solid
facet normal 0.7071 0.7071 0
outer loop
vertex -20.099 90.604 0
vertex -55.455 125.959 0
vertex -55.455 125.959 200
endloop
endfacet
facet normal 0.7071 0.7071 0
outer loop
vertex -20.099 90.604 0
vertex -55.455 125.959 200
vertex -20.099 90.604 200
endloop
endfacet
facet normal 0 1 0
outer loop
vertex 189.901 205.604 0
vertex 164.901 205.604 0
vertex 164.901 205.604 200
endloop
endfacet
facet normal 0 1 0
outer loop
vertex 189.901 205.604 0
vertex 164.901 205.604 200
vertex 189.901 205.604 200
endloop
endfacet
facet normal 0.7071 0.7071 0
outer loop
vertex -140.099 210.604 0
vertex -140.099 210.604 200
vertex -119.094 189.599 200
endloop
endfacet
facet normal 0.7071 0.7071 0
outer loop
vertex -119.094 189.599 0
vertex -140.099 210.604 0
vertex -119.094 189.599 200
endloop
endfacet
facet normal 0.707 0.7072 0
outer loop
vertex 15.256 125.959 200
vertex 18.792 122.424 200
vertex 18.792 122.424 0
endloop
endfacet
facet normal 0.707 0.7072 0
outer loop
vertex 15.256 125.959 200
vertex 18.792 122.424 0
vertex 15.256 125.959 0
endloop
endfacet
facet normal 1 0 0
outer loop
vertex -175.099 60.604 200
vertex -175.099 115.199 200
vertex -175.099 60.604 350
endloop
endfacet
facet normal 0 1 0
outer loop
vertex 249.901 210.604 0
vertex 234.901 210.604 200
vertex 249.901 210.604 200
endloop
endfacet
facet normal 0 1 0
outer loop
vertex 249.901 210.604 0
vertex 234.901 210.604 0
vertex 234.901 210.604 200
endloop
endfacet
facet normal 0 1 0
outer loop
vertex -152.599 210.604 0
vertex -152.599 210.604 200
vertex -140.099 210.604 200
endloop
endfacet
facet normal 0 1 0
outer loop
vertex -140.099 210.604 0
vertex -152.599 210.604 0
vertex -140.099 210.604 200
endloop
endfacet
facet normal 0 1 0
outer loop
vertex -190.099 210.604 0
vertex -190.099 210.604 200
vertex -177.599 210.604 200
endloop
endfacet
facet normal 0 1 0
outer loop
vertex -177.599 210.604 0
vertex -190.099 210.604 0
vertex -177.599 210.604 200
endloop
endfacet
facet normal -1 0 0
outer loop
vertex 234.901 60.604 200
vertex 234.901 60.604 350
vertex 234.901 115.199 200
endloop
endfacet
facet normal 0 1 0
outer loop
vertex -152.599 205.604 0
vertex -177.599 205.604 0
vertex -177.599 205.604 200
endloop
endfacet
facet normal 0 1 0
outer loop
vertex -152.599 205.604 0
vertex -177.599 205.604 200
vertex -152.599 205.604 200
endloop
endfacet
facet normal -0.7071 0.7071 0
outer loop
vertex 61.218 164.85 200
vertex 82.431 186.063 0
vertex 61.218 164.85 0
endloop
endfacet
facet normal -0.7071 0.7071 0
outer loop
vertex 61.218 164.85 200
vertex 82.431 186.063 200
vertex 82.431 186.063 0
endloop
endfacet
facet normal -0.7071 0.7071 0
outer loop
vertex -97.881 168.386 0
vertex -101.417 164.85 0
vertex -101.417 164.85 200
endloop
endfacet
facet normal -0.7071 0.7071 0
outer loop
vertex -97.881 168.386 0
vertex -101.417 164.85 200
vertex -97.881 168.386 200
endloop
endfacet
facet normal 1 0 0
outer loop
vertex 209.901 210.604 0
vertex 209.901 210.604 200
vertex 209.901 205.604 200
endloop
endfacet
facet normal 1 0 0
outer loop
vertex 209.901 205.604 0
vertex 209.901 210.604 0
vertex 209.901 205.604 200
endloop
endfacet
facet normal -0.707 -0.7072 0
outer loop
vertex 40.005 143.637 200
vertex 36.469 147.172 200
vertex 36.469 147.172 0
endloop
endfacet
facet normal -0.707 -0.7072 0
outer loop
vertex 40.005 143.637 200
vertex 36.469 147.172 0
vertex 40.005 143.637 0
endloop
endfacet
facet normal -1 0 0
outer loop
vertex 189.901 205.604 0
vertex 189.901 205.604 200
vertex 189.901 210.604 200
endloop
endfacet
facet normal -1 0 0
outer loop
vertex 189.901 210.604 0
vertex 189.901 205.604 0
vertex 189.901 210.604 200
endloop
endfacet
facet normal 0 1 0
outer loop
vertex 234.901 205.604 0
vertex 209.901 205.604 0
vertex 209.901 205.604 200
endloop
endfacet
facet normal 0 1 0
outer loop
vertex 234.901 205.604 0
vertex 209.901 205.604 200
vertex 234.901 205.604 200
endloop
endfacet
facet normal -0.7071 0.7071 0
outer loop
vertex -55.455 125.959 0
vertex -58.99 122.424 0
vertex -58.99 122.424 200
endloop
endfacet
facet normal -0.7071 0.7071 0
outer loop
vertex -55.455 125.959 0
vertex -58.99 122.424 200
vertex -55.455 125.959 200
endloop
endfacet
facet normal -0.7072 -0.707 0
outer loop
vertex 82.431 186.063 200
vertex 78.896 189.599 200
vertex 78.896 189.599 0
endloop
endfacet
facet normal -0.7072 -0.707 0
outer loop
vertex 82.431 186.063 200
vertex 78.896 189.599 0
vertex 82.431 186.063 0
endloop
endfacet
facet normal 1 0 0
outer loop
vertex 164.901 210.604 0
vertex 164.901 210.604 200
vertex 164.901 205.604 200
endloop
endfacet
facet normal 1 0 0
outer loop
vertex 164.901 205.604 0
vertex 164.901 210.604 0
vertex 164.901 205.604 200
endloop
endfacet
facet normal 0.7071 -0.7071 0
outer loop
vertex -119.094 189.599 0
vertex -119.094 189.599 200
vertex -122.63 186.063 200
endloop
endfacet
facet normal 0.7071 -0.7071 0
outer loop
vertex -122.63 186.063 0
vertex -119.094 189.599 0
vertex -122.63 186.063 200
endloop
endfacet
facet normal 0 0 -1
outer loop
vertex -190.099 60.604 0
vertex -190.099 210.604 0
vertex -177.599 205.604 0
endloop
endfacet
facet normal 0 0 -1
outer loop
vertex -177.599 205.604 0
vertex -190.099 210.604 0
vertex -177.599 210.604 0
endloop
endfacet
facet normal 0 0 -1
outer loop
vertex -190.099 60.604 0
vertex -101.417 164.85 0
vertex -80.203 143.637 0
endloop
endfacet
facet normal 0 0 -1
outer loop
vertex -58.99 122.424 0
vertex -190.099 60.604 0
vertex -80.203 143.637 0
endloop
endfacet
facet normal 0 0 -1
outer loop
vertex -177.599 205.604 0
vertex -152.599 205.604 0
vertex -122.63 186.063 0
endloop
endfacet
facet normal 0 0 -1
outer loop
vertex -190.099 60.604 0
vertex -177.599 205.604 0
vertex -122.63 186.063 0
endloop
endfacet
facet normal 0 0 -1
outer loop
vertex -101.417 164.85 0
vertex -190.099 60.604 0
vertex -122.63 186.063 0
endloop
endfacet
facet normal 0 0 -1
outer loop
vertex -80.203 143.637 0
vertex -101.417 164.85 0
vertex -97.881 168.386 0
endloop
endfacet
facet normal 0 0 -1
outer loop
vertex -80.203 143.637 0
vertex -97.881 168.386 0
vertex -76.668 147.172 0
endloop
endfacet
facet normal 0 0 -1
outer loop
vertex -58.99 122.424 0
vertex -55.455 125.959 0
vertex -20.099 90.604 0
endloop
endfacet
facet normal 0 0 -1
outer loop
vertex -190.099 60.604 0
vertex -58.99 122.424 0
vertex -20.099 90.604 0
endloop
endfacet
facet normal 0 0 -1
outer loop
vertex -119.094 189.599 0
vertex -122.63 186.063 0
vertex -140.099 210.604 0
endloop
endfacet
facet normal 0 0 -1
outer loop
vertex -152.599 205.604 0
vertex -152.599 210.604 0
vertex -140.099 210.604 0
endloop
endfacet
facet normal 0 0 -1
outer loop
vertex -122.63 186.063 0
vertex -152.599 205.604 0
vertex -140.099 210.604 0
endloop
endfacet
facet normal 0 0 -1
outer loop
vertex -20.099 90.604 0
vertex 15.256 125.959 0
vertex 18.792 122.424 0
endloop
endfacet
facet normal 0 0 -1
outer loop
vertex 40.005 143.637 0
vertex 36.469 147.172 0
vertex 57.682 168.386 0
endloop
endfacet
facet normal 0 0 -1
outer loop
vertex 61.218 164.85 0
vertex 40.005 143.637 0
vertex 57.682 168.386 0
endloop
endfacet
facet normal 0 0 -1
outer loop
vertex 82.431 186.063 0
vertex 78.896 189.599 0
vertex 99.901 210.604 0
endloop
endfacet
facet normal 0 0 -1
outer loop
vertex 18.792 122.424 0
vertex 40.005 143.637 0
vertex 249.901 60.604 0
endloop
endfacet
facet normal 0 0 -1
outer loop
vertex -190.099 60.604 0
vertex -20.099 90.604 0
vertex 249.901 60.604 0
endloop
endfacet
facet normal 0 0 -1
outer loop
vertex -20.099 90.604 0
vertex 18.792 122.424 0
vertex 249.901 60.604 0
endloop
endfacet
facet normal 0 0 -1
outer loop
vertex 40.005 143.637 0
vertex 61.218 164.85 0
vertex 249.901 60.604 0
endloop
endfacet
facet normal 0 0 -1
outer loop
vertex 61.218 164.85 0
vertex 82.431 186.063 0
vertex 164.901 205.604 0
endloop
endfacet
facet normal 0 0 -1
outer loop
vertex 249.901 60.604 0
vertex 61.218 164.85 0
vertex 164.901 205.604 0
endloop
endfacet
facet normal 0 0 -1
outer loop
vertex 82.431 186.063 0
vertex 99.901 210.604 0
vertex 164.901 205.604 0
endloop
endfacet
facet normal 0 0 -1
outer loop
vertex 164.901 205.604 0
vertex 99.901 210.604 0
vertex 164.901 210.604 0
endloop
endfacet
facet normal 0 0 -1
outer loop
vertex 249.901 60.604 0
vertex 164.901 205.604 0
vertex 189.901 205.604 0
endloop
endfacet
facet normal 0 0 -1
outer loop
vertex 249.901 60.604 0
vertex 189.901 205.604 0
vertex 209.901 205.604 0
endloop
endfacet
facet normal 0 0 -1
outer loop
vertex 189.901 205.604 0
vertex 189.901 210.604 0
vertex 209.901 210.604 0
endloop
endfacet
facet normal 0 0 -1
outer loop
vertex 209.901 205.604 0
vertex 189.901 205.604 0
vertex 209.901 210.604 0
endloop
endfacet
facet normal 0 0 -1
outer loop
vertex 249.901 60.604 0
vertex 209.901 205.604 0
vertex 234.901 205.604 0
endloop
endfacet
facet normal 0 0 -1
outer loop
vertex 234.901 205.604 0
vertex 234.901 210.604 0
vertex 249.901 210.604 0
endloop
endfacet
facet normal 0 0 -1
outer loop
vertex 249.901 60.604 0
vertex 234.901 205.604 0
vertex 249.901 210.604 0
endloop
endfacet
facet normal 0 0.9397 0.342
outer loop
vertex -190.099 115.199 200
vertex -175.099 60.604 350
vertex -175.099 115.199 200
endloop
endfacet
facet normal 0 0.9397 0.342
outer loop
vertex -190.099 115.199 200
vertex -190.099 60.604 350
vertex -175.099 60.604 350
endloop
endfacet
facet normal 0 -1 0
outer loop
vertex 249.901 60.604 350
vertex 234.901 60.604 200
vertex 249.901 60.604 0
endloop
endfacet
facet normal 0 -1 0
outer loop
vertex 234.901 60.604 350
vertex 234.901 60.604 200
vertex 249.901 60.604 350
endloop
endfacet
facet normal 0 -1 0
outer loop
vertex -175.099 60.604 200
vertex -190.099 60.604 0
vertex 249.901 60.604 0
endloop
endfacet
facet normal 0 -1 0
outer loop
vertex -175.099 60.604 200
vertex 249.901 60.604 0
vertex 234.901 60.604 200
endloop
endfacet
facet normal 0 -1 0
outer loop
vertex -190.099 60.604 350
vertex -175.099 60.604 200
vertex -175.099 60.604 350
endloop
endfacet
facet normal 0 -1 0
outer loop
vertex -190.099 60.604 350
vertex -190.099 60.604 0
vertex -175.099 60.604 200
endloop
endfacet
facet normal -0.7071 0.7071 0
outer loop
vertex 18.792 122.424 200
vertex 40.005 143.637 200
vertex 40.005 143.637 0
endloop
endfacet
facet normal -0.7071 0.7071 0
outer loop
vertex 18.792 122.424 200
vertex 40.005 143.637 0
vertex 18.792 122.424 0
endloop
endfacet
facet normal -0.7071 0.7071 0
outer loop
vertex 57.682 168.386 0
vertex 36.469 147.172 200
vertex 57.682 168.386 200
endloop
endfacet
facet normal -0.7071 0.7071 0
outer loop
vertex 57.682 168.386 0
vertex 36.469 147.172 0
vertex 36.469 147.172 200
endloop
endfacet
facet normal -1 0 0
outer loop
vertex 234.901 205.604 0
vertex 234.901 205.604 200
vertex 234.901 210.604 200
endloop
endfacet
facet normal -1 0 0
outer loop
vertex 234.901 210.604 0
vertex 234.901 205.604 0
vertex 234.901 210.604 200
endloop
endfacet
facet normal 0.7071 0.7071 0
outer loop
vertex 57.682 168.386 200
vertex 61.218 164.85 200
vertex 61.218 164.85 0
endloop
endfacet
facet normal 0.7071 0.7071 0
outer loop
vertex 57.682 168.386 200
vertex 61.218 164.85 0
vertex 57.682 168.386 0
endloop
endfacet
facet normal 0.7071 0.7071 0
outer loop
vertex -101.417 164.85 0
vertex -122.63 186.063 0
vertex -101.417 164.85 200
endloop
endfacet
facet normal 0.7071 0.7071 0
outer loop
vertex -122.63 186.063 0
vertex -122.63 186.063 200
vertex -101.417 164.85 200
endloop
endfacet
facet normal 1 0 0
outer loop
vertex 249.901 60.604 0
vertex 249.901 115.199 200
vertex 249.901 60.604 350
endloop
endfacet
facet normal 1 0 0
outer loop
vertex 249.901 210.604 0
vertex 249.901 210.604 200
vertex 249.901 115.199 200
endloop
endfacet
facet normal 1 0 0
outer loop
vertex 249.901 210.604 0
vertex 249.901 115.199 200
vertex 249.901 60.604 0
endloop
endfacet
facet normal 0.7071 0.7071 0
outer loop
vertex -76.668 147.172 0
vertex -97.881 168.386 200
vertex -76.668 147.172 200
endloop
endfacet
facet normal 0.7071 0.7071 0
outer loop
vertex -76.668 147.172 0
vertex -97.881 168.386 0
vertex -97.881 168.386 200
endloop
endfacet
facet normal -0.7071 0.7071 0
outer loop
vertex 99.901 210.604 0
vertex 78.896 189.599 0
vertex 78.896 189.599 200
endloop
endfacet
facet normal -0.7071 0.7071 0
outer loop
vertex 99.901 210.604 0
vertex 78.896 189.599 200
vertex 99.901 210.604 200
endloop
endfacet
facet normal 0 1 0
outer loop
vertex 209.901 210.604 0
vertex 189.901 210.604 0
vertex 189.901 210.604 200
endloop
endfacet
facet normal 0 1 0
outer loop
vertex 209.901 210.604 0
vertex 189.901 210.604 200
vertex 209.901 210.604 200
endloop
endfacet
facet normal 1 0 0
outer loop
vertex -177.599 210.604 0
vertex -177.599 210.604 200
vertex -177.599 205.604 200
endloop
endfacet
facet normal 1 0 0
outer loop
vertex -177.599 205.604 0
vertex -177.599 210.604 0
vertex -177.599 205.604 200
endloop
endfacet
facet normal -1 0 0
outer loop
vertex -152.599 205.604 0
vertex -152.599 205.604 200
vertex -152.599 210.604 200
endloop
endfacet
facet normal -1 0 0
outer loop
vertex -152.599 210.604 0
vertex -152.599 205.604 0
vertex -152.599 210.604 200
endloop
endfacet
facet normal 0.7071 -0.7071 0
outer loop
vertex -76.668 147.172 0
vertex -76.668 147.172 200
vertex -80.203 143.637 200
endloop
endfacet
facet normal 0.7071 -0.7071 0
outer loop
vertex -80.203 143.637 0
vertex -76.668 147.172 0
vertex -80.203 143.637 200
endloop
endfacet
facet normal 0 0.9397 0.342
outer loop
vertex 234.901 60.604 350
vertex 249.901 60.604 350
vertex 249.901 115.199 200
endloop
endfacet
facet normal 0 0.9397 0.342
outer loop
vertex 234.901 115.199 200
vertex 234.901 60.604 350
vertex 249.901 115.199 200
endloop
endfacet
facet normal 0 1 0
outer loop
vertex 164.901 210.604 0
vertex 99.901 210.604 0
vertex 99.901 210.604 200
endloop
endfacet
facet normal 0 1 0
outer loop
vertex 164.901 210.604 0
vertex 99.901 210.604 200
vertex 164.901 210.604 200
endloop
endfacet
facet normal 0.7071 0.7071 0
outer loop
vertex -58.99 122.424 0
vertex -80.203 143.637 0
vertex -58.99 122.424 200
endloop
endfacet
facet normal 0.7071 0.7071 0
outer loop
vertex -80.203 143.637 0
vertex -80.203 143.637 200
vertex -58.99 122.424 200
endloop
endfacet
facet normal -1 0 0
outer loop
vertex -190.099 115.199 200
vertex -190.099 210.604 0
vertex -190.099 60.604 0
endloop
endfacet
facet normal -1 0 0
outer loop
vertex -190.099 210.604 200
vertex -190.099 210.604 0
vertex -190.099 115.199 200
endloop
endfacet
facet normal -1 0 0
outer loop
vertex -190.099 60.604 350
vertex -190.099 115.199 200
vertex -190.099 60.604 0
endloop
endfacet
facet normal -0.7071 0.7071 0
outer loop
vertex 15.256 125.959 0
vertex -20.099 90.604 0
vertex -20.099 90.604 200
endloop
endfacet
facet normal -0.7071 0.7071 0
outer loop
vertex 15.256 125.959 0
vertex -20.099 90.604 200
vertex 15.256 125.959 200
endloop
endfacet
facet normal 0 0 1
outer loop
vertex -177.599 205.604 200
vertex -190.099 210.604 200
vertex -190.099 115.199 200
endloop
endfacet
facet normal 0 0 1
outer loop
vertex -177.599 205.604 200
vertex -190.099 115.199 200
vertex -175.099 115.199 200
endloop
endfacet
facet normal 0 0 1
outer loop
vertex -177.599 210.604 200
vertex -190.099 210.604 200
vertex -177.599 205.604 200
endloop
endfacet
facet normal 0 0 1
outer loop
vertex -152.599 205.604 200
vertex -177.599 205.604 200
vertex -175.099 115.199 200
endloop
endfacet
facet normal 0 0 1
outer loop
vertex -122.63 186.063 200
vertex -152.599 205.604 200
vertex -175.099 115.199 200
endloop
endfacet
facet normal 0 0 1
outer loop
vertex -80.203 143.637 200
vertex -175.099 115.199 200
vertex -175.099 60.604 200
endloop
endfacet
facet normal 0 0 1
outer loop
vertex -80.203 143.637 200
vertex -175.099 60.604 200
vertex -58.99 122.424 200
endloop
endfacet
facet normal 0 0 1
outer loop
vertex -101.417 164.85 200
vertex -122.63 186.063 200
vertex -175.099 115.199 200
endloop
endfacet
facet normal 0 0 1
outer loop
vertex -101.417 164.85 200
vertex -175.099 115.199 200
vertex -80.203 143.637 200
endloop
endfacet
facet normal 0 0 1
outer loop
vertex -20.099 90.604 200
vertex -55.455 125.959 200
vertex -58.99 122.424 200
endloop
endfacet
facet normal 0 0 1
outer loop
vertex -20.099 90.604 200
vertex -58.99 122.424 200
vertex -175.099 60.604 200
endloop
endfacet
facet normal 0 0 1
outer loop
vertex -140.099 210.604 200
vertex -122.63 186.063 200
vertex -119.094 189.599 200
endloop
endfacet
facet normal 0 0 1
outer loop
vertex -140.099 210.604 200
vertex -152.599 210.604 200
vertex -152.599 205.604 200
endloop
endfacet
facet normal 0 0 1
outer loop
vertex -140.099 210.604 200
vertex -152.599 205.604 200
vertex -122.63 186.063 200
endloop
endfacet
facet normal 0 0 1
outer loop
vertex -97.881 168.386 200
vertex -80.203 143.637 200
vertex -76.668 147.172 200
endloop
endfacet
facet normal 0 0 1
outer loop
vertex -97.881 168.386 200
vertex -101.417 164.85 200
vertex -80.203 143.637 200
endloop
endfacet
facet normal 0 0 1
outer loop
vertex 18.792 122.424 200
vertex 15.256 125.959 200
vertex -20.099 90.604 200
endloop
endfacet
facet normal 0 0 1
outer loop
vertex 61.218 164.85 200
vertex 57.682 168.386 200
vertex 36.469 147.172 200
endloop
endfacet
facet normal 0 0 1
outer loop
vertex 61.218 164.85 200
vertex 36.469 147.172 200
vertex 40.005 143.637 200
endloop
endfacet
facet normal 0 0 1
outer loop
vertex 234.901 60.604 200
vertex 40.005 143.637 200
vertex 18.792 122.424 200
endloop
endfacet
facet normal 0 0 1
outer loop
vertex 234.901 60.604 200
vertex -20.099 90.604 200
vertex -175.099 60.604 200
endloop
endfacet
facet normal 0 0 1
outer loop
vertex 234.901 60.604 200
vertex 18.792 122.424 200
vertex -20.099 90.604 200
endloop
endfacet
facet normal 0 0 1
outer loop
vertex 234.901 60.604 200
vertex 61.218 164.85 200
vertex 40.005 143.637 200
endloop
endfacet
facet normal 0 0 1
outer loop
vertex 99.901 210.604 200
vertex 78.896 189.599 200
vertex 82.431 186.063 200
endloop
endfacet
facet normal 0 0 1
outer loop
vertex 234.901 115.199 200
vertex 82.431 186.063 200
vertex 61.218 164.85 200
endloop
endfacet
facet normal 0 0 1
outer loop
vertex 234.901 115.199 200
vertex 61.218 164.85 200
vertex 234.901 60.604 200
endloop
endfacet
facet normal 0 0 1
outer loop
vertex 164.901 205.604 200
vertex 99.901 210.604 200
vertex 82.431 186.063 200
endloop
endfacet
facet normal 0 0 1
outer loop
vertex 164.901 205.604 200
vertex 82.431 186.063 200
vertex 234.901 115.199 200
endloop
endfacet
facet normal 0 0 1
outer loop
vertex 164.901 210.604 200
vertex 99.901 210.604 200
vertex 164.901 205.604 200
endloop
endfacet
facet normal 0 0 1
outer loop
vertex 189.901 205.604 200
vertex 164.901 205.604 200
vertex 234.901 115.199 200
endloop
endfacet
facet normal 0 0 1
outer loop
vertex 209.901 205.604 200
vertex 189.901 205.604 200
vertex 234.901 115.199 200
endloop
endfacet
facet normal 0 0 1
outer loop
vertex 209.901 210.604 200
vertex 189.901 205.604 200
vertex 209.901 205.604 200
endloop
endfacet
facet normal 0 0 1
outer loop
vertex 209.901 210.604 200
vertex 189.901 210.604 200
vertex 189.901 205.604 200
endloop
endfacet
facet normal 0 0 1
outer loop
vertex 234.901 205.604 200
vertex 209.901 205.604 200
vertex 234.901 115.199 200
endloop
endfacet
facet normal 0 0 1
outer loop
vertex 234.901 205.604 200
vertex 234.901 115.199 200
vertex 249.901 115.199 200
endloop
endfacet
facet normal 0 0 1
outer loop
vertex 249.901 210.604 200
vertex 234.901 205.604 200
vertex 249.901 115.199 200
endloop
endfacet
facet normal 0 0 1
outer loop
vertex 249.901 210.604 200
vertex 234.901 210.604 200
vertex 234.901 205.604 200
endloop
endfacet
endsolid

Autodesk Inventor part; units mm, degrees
ref_plane "YZ Plane" through (0, 0, 0) normal (1, 0, 0) x (0, 1, 0)
ref_plane "XZ Plane" through (0, 0, 0) normal (0, 1, 0) x (-1, 0, 0)
ref_plane "XY Plane" through (0, 0, 0) normal (0, 0, 1) x (1, 0, 0)
sketch "Sketch1" plane through (0, 0, 0) normal (0, 0, 1) x (1, 0, 0)
  line L0 (-190.0993, 60.6039) -> (-190.0993, 210.6039)
  line L1 (149.9007, 210.6039) -> (149.9007, 60.6039)
  line L2 (149.9007, 60.6039) -> (-190.0993, 60.6039)
  line L3 (149.9007, 210.6039) -> (249.9007, 210.6039)
  line L4 (249.9007, 210.6039) -> (249.9007, 60.6039)
  line L5 (249.9007, 60.6039) -> (149.9007, 60.6039)
  line L6 (-190.0993, 210.6039) -> (-140.0993, 210.6039)
  line L7 (-140.0993, 210.6039) -> (-20.0993, 90.6039)
  line L8 (-20.0993, 90.6039) -> (99.9007, 210.6039)
  line L9 (99.9007, 210.6039) -> (149.9007, 210.6039)
  point P0 (0, 0)
  dimension "d0" = 340
  dimension "d1" = 150
  dimension "d2" = 150
  dimension "d3" = 170
  dimension "d5" = 100
  dimension "d16" = 90
  dimension "d17" = 50
  dimension "d18" = 50
extrude "Extrusion1" add sketch "Sketch1" along normal blind 200
sketch "Sketch2" plane through (0, 0, 200) normal (0, 0, 1) x (1, 0, 0)
  point P0 (0, 0)
sketch "Sketch3" plane through (249.9007, 60.6039, 0) normal (1, 0, 0) x (0, 0, -1)
  line L0 (0, 0) -> (0, 150) projected
  line L1 (0, 150) -> (-200, 150) projected
  line L2 (-200, 0) -> (-200, 150) projected
  line L3 (0, 0) -> (-200, 0) projected
  line L4 (-200, 0) -> (-350, 0)
  line L5 (-350, 0) -> (-200, 54.5955)
  line L6 (-200, 0) -> (-200, 150) projected
  point P0 (0, -60.6039)
  dimension "d12" = 20
  dimension "d13" = 150
extrude "Extrusion2" add sketch "Sketch3" against normal blind 15 contours L4 L5 L2
sketch "Sketch4" plane through (-190.0993, 60.6039, 0) normal (-1, 0, 0) x (0, 0, 1)
  line L0 (200, 0) -> (200, 54.5955) projected
  line L1 (200, 0) -> (350, 0) projected
  line L2 (350, 0) -> (200, 54.5955) projected
  point P0 (0, -60.6039)
extrude "Extrusion3" add sketch "Sketch4" against normal blind 15
sketch "Sketch5" plane through (0, 0, 200) normal (0, 0, 1) x (1, 0, 0)
  line L0 (-119.0942, 189.5988) -> (-122.6298, 186.0633)
  line L1 (-122.6298, 186.0633) -> (-101.4166, 164.8501)
  line L2 (-101.4166, 164.8501) -> (-97.881, 168.3856)
  line L3 (-20.0993, 90.6039) -> (-140.0993, 210.6039) projected
  line L4 (-76.6678, 147.1724) -> (-80.2034, 143.6369)
  line L5 (-80.2034, 143.6369) -> (-58.9902, 122.4237)
  line L6 (-58.9902, 122.4237) -> (-55.4546, 125.9592)
  line L7 (-20.0993, 90.6039) -> (-20.0993, 149.2833) construction
  line L8 (78.8957, 189.5988) -> (82.4312, 186.0633)
  line L9 (82.4312, 186.0633) -> (61.218, 164.8501)
  line L10 (61.218, 164.8501) -> (57.6825, 168.3856)
  line L11 (36.4693, 147.1724) -> (40.0048, 143.6369)
  line L12 (40.0048, 143.6369) -> (18.7916, 122.4237)
  line L13 (18.7916, 122.4237) -> (15.256, 125.9592)
  line L14 (-175.0993, 115.1994) -> (-175.0993, 60.6039) projected
  line L15 (-175.0993, 60.6039) -> (234.9007, 60.6039) projected
  line L16 (234.9007, 60.6039) -> (234.9007, 115.1994) projected
  line L17 (234.9007, 115.1994) -> (249.9007, 115.1994) projected
  line L18 (249.9007, 115.1994) -> (249.9007, 210.6039) projected
  line L19 (249.9007, 210.6039) -> (99.9007, 210.6039) projected
  line L20 (99.9007, 210.6039) -> (-20.0993, 90.6039) projected
  line L21 (-20.0993, 90.6039) -> (-140.0993, 210.6039) projected
  line L22 (-140.0993, 210.6039) -> (-190.0993, 210.6039) projected
  line L23 (-190.0993, 210.6039) -> (-190.0993, 115.1994) projected
  line L24 (-190.0993, 115.1994) -> (-175.0993, 115.1994) projected
  line L25 (249.9007, 210.6039) -> (99.9007, 210.6039) projected
  line L26 (164.9007, 210.6039) -> (164.9007, 205.6039)
  line L27 (164.9007, 205.6039) -> (189.9007, 205.6039)
  line L28 (189.9007, 205.6039) -> (189.9007, 210.6039)
  line L29 (209.9007, 210.6039) -> (209.9007, 205.6039)
  line L30 (209.9007, 205.6039) -> (234.9007, 205.6039)
  line L31 (234.9007, 205.6039) -> (234.9007, 210.6039)
  line L32 (-140.0993, 210.6039) -> (-190.0993, 210.6039) projected
  line L33 (-177.5993, 210.6039) -> (-177.5993, 205.6039)
  line L34 (-177.5993, 205.6039) -> (-152.5993, 205.6039)
  line L35 (-152.5993, 205.6039) -> (-152.5993, 210.6039)
  point P0 (0, 0)
  point P1 (78.8957, 189.5988)
  point P2 (57.6825, 168.3856)
  point P3 (36.4693, 147.1724)
  dimension "d19" = 5
  dimension "d20" = 30
  dimension "d21" = 5
  dimension "d22" = 30
  dimension "d23" = 50
  dimension "d24" = 30
  dimension "d27" = 5
  dimension "d28" = 25
  dimension "d29" = 25
  dimension "d30" = 20
  dimension "d31" = 15
  dimension "d32" = 25
  dimension "d33" = 12.5
  dimension "d34" = 5
extrude "Extrusion4" cut sketch "Sketch5" against normal up to surface (200 mm away) contours L3 L2 L1 L0 | L3 L6 L5 L4 | L35 L34 L33 L22 | L20 L11 L12 L13 | L20 L8 L9 L10 | L19 L28 L27 L26 | L19 L31 L30 L29
equation "\"d2\" = d1"
equation "\"d3\" = 0.5 * d0"
equation "\"d18\" = d17"
equation "\"d21\" = d19"
equation "\"d22\" = d20"
equation "\"d27\" = d19"
equation "\"d29\" = d28"
properties part number "Modelo base"
